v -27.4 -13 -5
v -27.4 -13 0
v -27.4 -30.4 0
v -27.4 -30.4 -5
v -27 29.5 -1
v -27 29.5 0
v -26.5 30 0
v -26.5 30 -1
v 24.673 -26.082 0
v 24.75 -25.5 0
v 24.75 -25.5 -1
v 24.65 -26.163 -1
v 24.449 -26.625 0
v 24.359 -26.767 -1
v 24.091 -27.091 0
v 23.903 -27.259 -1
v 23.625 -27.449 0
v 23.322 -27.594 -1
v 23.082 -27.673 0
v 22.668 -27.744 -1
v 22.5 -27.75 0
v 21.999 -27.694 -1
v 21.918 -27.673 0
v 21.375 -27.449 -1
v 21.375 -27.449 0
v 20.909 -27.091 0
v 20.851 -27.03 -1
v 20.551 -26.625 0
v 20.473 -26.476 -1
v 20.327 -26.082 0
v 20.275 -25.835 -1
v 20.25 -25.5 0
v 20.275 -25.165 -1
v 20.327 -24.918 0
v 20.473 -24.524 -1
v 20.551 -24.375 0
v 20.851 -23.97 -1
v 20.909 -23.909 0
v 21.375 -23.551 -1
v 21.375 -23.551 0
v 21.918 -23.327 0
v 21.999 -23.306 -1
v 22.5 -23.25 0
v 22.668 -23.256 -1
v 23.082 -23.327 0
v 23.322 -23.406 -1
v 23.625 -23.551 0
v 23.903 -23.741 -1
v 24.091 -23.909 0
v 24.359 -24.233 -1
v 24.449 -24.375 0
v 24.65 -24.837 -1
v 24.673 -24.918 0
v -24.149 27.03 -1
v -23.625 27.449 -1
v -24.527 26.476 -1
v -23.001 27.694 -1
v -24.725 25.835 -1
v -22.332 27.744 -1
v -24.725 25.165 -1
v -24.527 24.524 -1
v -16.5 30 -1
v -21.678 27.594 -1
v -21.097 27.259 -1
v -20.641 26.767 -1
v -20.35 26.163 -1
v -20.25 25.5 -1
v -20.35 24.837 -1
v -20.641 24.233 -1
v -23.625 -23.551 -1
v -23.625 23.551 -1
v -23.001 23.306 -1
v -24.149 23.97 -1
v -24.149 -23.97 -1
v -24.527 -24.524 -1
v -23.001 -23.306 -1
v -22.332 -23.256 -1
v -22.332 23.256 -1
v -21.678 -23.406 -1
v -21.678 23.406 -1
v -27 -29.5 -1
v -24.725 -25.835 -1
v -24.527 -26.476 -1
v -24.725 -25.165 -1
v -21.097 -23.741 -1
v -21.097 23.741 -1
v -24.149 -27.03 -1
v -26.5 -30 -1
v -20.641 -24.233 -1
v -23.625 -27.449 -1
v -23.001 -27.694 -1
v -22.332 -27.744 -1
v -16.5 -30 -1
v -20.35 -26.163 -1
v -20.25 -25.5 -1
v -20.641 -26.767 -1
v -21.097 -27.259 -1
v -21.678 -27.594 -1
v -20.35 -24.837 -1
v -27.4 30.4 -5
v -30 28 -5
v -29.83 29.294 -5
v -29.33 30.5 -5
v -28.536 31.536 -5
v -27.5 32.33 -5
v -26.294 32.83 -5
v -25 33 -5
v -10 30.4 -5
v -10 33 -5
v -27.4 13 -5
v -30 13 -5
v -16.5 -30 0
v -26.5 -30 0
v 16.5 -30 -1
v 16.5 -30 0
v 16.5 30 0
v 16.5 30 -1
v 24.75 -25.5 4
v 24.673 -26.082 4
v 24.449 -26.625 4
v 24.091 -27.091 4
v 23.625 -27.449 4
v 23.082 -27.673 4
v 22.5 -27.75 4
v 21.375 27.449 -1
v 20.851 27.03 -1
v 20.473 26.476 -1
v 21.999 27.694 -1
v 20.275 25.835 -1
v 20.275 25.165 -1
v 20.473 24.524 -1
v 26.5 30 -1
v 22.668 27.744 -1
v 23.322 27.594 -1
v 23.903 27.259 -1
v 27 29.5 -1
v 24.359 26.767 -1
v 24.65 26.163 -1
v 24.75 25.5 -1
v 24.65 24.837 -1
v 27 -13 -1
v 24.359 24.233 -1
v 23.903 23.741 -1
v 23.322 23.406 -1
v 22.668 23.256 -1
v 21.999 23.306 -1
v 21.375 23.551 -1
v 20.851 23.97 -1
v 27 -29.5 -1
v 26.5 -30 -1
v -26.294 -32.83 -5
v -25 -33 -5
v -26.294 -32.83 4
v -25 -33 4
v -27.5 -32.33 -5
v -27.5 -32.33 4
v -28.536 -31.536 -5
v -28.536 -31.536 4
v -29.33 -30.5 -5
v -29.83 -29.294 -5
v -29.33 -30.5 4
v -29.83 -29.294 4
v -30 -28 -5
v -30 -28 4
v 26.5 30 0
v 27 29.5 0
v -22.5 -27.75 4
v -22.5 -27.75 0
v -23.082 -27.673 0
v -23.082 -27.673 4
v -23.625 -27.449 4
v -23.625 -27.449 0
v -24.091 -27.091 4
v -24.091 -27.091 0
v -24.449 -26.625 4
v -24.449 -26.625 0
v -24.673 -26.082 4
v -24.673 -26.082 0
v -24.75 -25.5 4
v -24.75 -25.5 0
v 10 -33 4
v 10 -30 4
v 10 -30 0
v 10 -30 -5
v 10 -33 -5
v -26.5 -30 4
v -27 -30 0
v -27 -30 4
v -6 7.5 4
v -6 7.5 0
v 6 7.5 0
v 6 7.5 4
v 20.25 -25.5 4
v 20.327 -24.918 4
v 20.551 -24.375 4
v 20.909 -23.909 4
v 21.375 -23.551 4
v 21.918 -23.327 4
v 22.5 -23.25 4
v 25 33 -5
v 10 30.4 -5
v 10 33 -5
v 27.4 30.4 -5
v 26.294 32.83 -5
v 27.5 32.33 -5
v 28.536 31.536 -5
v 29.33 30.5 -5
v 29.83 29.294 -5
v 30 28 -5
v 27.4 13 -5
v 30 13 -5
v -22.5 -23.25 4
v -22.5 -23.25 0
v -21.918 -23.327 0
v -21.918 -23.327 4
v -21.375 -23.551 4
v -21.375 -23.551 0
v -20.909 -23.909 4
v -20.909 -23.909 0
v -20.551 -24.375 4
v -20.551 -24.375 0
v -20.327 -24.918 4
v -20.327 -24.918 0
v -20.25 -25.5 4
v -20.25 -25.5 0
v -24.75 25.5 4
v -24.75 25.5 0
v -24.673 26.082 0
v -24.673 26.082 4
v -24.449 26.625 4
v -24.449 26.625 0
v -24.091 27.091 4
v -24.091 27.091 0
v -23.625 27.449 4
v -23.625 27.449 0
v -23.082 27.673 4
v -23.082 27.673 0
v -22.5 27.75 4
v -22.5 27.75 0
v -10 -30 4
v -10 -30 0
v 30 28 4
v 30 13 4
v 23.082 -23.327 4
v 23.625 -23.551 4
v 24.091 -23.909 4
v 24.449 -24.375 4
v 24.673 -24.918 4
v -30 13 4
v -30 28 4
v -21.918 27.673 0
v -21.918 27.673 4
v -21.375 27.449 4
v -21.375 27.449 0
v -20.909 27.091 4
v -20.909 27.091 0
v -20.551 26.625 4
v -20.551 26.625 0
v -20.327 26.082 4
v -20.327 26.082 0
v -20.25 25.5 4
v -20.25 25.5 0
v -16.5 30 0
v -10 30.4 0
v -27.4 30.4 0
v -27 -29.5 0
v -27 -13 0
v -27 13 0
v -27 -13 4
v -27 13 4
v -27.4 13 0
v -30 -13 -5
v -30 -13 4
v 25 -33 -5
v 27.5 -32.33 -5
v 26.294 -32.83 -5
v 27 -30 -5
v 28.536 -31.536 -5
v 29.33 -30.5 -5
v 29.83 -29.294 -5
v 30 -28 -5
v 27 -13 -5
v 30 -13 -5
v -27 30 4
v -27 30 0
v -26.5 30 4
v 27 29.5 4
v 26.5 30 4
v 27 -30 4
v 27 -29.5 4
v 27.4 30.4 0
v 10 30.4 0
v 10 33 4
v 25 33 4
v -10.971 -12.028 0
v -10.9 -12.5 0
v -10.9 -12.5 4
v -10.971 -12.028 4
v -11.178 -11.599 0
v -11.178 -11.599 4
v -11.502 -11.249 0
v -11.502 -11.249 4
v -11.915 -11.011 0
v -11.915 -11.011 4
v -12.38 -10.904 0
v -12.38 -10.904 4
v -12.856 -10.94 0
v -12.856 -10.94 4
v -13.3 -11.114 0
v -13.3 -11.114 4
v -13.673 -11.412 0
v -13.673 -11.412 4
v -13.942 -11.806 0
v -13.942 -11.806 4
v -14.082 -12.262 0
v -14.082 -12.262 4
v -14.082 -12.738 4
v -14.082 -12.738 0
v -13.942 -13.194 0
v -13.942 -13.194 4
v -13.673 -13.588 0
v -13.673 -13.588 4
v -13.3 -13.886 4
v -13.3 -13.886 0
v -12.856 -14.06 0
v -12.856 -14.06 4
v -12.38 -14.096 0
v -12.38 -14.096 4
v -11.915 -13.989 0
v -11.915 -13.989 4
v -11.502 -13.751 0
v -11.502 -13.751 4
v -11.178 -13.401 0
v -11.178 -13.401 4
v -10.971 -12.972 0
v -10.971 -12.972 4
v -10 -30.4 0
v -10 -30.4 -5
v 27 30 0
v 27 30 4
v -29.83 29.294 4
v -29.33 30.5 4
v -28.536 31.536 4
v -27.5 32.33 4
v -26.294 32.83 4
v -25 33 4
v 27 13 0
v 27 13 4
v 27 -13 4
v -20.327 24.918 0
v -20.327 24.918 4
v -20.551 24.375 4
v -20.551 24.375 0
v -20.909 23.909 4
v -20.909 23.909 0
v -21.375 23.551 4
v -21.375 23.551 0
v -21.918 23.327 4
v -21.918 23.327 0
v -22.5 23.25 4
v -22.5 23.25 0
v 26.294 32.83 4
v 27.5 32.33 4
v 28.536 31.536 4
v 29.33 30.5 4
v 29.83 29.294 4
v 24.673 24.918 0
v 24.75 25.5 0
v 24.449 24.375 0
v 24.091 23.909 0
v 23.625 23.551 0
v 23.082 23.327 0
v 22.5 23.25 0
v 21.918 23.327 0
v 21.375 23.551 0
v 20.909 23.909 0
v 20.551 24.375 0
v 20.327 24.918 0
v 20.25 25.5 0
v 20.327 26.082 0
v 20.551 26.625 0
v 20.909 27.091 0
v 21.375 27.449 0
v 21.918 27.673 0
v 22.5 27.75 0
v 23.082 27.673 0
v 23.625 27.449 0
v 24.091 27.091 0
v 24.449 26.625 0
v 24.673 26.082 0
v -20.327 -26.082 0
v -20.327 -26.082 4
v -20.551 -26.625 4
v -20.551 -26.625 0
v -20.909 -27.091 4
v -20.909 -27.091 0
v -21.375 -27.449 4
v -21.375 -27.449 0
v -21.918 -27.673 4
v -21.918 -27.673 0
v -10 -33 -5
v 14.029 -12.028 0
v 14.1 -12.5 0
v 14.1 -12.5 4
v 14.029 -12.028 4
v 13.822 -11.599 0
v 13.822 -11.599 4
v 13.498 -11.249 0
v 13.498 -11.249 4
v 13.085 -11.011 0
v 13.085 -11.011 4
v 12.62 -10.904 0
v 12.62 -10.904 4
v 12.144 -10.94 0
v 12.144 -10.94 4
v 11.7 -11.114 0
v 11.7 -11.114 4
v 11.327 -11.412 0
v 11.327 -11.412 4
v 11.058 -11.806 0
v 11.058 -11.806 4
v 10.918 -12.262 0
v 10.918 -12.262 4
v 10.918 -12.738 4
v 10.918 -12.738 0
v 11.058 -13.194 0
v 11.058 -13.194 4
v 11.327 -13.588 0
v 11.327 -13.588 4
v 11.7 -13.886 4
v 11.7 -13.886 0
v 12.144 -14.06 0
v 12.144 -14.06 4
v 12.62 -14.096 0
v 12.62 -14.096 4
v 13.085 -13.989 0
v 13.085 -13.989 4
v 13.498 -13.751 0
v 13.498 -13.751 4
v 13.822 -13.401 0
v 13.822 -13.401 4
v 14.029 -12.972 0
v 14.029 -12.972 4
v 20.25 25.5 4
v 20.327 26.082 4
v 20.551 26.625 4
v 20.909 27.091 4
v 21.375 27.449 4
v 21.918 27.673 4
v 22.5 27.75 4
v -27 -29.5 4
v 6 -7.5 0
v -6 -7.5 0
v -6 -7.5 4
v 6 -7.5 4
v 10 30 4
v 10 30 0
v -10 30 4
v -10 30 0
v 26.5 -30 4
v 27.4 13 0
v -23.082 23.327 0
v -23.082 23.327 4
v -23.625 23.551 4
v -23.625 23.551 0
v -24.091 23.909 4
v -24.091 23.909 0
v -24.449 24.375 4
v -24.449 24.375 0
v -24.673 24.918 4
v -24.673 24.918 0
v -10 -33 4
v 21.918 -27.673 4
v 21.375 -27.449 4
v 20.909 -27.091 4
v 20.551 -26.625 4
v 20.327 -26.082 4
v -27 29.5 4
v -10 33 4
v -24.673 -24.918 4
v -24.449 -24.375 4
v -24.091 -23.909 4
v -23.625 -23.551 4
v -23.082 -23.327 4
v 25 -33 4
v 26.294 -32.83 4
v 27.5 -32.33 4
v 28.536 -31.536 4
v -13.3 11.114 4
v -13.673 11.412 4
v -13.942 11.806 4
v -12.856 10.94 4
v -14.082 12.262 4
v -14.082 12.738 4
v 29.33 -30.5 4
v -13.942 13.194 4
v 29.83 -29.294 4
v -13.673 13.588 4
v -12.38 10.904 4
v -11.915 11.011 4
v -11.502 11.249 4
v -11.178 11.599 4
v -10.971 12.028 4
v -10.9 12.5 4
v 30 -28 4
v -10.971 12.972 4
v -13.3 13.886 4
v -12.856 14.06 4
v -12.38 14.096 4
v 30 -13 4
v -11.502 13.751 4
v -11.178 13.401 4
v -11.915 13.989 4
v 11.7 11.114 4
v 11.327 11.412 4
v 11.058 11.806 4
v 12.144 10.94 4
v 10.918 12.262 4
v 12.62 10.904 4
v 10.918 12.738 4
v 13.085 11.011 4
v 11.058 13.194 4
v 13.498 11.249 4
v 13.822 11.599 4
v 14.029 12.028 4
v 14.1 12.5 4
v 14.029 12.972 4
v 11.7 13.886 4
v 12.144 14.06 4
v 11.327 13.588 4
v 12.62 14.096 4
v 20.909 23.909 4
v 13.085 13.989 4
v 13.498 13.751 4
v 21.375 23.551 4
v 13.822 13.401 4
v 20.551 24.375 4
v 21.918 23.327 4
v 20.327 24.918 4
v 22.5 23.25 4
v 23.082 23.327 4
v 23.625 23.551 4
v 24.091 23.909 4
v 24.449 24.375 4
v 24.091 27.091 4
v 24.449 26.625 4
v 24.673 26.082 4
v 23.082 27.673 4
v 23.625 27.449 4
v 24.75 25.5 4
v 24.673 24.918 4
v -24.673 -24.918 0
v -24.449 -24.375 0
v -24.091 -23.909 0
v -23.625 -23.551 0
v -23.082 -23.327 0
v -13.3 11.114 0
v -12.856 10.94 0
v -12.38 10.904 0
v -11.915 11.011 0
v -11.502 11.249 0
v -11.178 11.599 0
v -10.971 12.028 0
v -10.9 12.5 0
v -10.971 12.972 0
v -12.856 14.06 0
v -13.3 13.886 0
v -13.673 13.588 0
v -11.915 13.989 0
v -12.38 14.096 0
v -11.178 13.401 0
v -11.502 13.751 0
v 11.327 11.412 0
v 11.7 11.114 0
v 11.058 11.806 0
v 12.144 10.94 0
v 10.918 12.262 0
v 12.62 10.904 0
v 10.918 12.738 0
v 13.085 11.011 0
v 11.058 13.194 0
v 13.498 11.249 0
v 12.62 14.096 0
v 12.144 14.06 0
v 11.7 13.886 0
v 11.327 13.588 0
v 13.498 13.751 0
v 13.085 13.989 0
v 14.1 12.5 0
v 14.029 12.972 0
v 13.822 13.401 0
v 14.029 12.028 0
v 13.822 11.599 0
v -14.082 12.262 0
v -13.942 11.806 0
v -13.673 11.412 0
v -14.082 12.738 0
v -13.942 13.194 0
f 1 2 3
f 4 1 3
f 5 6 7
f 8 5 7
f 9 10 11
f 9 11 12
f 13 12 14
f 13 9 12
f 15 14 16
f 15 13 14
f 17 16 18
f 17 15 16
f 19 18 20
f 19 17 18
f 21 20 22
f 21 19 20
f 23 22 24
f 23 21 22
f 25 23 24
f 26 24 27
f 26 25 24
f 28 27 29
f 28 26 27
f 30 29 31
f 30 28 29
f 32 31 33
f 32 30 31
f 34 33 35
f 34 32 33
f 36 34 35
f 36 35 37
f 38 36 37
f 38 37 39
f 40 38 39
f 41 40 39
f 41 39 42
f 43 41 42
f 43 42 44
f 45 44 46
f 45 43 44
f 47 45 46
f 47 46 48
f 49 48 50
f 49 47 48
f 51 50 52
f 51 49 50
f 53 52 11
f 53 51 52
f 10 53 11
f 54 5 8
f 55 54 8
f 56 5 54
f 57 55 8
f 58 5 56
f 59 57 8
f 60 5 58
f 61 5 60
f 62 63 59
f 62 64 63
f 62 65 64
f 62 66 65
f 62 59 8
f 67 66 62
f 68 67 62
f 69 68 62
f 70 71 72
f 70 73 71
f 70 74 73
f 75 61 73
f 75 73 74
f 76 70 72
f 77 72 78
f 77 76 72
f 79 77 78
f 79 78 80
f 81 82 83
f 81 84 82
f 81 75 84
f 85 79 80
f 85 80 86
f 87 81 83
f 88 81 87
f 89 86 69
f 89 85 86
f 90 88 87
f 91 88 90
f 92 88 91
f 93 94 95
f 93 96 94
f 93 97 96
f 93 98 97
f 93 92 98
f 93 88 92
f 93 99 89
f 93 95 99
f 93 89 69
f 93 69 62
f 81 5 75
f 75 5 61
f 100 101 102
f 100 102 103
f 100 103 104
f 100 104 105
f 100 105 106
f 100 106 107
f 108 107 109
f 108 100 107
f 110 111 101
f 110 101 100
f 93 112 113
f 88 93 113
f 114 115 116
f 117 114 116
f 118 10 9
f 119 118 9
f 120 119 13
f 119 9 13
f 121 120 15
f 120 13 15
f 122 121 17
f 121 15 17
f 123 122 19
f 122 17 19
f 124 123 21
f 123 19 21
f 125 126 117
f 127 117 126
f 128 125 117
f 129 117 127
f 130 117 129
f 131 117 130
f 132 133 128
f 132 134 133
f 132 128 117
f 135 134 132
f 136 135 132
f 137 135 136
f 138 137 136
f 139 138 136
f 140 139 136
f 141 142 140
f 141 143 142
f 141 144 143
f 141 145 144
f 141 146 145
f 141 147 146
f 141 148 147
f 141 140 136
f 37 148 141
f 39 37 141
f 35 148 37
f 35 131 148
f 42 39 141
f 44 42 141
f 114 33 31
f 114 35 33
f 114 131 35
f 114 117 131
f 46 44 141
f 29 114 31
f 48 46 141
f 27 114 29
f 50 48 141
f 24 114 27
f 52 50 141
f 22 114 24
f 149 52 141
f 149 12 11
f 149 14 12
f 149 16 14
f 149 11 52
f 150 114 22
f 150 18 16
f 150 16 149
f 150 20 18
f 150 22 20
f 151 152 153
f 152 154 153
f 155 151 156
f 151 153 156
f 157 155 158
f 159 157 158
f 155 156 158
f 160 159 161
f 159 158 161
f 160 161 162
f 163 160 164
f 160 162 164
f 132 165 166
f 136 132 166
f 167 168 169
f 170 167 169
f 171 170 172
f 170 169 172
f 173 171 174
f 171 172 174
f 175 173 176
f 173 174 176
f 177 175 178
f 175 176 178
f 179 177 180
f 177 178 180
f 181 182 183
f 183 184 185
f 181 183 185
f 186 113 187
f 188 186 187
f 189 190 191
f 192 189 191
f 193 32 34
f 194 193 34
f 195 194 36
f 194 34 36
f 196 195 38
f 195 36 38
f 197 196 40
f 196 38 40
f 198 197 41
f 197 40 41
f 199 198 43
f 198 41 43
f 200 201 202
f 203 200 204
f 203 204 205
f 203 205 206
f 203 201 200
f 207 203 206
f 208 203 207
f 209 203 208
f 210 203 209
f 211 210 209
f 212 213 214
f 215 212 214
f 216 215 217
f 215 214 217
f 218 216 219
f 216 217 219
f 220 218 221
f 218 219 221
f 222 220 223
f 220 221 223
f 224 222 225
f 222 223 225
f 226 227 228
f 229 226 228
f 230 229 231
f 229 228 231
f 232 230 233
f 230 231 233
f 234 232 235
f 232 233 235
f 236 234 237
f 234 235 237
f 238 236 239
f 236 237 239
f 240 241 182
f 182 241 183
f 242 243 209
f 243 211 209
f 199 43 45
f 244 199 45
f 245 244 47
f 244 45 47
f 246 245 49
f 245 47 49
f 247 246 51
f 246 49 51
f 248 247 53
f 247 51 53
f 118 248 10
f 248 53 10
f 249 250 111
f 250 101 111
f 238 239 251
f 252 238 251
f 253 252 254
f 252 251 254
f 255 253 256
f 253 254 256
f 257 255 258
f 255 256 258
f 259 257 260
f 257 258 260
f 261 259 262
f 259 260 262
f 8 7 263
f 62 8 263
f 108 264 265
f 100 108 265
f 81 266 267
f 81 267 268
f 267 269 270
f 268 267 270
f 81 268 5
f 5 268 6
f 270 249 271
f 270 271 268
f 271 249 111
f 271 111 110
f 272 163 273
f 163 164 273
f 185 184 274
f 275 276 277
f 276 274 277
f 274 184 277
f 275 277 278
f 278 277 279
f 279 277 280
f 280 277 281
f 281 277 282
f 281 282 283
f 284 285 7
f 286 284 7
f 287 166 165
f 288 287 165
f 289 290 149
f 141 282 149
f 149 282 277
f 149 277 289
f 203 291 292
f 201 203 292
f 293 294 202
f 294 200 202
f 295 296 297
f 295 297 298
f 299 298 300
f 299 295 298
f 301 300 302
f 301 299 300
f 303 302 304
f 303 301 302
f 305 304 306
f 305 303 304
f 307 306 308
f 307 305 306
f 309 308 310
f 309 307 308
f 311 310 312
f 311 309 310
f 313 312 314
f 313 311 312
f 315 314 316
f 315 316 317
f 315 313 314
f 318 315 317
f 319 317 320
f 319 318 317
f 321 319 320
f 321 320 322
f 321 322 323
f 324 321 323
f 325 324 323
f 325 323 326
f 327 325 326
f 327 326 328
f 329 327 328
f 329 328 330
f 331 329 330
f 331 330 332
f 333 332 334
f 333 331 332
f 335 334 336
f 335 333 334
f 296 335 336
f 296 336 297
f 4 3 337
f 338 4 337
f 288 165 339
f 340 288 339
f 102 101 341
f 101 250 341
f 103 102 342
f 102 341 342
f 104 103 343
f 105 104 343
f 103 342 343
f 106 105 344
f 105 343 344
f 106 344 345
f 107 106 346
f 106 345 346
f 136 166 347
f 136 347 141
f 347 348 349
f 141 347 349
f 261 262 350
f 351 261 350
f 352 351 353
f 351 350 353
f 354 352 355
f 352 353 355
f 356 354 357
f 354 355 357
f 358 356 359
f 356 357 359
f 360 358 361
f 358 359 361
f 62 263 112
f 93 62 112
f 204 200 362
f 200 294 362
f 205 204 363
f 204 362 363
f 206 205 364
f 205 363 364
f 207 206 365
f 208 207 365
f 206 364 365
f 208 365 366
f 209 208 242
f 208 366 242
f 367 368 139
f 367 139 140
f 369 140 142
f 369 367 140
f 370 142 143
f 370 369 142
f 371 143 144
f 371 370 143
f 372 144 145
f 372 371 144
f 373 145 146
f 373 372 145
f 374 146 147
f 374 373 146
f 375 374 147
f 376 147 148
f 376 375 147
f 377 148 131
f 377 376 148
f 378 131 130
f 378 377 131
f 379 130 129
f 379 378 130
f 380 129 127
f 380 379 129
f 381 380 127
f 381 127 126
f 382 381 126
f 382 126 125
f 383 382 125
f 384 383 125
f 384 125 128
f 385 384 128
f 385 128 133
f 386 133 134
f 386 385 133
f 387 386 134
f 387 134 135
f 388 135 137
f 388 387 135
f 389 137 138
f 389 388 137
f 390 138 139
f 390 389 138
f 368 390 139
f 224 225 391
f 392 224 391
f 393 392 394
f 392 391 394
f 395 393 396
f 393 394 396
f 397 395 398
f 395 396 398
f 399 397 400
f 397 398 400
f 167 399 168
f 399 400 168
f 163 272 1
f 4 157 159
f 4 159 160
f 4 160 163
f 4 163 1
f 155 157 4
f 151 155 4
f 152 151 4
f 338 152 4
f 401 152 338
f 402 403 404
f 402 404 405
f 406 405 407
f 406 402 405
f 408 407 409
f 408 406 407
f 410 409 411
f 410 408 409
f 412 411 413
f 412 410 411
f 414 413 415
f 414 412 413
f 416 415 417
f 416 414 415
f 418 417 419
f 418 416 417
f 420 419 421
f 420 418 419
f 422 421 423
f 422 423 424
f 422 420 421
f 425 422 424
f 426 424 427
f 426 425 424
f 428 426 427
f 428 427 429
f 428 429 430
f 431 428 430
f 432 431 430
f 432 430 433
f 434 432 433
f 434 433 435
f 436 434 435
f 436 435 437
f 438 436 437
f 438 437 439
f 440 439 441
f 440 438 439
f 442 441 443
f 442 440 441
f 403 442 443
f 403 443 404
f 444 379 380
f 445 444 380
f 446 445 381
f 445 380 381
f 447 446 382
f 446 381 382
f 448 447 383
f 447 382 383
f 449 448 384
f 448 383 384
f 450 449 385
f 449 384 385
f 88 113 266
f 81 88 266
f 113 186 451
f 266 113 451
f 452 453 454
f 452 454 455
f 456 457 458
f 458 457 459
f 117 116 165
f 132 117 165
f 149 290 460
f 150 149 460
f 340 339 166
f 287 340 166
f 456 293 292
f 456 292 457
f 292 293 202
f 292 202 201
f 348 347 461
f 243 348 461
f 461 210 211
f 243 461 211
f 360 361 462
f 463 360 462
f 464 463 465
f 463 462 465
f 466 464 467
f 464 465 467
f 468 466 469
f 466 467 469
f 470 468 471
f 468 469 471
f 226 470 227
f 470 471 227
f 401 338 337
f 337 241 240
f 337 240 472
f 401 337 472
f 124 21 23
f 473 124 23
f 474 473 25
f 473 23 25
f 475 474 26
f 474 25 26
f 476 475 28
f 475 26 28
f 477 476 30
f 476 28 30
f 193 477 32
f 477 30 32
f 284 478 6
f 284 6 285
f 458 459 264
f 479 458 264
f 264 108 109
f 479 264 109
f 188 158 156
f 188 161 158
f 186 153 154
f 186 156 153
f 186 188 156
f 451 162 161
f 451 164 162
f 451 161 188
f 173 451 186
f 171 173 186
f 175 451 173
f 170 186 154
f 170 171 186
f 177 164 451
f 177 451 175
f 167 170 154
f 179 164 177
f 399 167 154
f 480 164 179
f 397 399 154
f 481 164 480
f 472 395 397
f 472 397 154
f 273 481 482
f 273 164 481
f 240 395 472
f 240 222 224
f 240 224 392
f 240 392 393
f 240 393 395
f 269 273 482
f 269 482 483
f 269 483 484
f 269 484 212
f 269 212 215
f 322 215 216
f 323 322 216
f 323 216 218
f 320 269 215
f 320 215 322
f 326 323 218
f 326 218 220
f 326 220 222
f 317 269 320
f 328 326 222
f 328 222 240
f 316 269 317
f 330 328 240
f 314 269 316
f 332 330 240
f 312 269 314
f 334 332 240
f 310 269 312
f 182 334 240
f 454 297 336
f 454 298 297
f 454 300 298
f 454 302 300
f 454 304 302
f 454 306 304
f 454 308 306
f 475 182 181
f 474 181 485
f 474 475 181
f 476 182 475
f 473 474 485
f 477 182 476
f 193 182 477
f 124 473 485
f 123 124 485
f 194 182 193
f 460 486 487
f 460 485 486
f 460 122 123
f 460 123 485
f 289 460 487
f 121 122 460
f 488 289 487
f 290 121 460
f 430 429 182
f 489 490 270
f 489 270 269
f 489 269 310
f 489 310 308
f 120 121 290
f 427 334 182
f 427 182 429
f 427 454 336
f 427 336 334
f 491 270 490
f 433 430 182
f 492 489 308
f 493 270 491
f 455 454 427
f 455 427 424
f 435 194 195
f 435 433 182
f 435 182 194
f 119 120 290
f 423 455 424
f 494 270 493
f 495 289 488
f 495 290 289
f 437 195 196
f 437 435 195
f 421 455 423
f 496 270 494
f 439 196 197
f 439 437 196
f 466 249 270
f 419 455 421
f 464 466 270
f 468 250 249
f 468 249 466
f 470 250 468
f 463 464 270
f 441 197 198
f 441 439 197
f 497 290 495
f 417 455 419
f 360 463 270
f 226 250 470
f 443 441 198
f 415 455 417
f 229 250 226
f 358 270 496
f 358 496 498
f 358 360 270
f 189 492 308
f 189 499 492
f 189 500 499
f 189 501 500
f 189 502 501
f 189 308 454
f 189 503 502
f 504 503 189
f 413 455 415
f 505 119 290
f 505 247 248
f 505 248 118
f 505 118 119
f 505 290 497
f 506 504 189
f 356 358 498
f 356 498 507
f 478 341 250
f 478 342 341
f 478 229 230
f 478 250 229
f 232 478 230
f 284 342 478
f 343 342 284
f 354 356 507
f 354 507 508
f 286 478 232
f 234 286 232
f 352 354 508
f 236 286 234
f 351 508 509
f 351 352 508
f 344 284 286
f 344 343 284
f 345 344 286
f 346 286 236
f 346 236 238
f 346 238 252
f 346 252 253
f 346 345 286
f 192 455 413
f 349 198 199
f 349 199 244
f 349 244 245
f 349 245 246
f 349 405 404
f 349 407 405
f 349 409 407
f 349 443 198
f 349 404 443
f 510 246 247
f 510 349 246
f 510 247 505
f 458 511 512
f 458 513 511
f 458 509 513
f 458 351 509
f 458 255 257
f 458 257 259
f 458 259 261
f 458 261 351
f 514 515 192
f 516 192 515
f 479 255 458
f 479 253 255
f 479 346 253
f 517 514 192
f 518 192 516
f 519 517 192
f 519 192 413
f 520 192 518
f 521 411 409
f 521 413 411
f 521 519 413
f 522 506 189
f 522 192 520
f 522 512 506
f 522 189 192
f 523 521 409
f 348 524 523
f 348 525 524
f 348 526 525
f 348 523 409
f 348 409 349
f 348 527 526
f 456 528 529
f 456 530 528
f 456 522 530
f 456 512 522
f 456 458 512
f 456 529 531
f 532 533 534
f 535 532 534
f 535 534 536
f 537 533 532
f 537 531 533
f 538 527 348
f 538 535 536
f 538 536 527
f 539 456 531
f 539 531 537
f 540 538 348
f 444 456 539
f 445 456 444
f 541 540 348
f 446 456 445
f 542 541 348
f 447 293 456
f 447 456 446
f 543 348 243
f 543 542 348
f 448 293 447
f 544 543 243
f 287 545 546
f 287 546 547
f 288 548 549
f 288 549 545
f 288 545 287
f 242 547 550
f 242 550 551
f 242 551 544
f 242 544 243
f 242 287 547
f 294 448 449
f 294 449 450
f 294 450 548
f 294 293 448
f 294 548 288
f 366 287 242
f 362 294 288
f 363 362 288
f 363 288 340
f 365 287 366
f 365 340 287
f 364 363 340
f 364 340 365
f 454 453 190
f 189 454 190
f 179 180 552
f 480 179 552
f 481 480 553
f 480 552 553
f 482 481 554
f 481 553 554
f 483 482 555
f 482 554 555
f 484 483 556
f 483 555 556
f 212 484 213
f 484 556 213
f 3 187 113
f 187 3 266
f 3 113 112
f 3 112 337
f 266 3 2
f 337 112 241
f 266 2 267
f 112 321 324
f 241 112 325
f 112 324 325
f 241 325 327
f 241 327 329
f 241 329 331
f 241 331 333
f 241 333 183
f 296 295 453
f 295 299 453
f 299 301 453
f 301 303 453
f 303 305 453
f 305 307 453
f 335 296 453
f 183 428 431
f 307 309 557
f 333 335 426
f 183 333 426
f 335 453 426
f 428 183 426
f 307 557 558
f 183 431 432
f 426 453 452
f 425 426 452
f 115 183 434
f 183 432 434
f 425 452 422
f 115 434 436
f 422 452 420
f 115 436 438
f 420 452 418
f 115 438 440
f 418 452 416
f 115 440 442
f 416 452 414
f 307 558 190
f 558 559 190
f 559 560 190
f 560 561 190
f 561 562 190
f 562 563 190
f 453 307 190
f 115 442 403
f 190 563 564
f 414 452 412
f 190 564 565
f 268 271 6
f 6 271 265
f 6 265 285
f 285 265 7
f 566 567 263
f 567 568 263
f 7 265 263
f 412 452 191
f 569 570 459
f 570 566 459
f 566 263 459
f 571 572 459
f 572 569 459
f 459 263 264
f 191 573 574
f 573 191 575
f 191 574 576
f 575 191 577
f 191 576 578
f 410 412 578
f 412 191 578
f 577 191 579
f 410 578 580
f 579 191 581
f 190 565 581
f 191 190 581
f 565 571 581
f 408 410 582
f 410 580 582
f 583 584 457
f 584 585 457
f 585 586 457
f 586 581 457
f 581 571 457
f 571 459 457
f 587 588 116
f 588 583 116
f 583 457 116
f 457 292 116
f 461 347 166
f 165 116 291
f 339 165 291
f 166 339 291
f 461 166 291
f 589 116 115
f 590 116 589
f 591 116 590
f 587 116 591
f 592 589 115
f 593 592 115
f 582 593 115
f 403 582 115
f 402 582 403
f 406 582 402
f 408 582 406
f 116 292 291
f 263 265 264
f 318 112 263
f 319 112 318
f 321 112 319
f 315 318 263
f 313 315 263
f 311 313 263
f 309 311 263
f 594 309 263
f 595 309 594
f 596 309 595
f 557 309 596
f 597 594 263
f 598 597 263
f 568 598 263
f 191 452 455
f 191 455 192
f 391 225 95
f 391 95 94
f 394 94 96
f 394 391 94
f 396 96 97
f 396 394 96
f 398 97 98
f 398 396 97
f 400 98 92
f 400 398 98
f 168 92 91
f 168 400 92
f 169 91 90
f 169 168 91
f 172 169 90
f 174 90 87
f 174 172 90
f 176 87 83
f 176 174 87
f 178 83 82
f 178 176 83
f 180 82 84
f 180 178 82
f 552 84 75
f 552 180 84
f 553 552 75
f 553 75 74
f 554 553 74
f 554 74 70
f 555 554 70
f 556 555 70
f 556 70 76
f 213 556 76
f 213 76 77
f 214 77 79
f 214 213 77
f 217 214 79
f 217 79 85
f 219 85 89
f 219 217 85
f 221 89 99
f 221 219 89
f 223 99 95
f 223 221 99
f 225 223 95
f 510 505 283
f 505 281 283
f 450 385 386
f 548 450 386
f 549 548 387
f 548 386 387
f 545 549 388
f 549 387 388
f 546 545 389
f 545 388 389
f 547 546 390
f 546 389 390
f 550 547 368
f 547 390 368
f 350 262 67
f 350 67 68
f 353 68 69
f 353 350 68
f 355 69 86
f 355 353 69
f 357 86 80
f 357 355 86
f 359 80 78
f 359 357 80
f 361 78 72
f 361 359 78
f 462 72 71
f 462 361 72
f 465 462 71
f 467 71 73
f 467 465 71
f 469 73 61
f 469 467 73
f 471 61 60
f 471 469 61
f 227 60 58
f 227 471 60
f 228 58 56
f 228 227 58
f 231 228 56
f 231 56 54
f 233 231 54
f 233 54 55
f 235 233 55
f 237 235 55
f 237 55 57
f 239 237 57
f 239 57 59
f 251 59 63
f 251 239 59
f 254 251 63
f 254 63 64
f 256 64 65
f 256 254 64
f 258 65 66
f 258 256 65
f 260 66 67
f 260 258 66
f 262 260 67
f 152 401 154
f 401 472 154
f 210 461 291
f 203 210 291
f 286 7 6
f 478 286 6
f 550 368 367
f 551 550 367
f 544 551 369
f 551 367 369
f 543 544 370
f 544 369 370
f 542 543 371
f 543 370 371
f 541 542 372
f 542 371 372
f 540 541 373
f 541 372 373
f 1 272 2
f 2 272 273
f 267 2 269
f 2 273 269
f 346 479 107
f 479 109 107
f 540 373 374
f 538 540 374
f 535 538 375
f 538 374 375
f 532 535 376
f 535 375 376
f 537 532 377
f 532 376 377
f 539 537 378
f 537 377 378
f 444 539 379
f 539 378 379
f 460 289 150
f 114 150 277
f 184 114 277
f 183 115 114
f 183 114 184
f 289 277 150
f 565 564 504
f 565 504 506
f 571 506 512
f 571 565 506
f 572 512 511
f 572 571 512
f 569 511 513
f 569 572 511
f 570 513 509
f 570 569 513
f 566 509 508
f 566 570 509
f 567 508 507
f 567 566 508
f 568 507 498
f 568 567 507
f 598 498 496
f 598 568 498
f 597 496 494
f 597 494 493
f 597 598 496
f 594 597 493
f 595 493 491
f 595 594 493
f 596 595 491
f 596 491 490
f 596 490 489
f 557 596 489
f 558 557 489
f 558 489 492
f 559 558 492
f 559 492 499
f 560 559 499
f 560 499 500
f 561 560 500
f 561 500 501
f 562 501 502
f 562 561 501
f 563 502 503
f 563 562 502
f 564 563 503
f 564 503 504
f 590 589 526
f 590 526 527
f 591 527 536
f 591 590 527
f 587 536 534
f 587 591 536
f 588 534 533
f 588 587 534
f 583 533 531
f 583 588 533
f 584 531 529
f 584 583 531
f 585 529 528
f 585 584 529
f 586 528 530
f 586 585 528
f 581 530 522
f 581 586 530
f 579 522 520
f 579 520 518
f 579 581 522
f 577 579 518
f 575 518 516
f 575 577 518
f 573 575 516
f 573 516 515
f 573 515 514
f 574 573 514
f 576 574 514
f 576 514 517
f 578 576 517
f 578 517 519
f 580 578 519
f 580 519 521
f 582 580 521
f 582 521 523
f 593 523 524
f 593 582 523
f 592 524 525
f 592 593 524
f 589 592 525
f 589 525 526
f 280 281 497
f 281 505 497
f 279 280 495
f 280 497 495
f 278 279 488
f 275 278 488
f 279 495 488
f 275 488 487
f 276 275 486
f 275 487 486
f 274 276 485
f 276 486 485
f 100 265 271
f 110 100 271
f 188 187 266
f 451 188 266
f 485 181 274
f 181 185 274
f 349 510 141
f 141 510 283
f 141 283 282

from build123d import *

# Parameters (mm, degrees)
F0_R     = 1.6
F0_W     = 12
F0_H     = 15
F1_DEPTH = 4
F2_R     = 2.25
F3_DEPTH = 1
F4_DEPTH = 5
F5_R     = 5


# Not quite as in the source:
# - ends of sketch curves that miss each other by under 0.0002 mm in the source are joined


with BuildPart() as f1:
    # F0 (on Top) → F1 (new body)
    with BuildSketch(Plane.XY):
        Polygon((-26.600003, -29.899997), (-26.5, -30), (-10, -30), (10, -30), (26.5, -30), (26.6, -29.9), (27, -29.5), (27, -13), (27, 13), (27, 29.5), (26.5999975, 29.9000025), (26.5, 30), (10, 30), (-10, 30), (-26.5, 30), (-26.599999, 29.900001), (-27, 29.5), (-27, 13), (-27, -13), (-27, -29.5), align=None)
        with BuildLine():
            ThreePointArc((-22.5, -23.25), (-20.9090097423, -23.9090097423), (-20.25, -25.5))
            ThreePointArc((-20.25, -25.5), (-20.9090097423, -27.0909902577), (-22.5, -27.75))
            ThreePointArc((-22.5, -27.75), (-24.0909902577, -27.0909902577), (-24.75, -25.5))
            ThreePointArc((-24.75, -25.5), (-24.0909902577, -23.9090097423), (-22.5, -23.25))
        make_face(mode=Mode.SUBTRACT)
        with Locations((-12.5, -12.5)):
            Circle(F0_R, mode=Mode.SUBTRACT)
        with BuildLine():
            ThreePointArc((22.5, -23.25), (24.0909902577, -23.9090097423), (24.75, -25.5))
            ThreePointArc((24.75, -25.5), (24.0909902577, -27.0909902577), (22.5, -27.75))
            ThreePointArc((22.5, -27.75), (20.9090097423, -27.0909902577), (20.25, -25.5))
            ThreePointArc((20.25, -25.5), (20.9090097423, -23.9090097423), (22.5, -23.25))
        make_face(mode=Mode.SUBTRACT)
        with Locations((12.5, -12.5)):
            Circle(F0_R, mode=Mode.SUBTRACT)
        with Locations((-12.5, 12.5)):
            Circle(F0_R, mode=Mode.SUBTRACT)
        with BuildLine():
            ThreePointArc((-22.5, 27.75), (-20.9090097423, 27.0909902577), (-20.25, 25.5))
            ThreePointArc((-20.25, 25.5), (-20.9090097423, 23.9090097423), (-22.5, 23.25))
            ThreePointArc((-22.5, 23.25), (-24.0909902577, 23.9090097423), (-24.75, 25.5))
            ThreePointArc((-24.75, 25.5), (-24.0909902577, 27.0909902577), (-22.5, 27.75))
        make_face(mode=Mode.SUBTRACT)
        Rectangle(F0_W, F0_H, mode=Mode.SUBTRACT)
        with Locations((12.5, 12.5)):
            Circle(F0_R, mode=Mode.SUBTRACT)
        with BuildLine():
            ThreePointArc((22.5, 27.75), (24.0909902577, 27.0909902577), (24.75, 25.5))
            ThreePointArc((24.75, 25.5), (24.0909902577, 23.9090097423), (22.5, 23.25))
            ThreePointArc((22.5, 23.25), (20.9090097423, 23.9090097423), (20.25, 25.5))
            ThreePointArc((20.25, 25.5), (20.9090097423, 27.0909902577), (22.5, 27.75))
        make_face(mode=Mode.SUBTRACT)
        Polygon((-10, -30), (-26.5, -30), (-26.6, -30), (-27, -30), (-27, -29.5), (-27, -13), (-30, -13), (-30, -33), (-10, -33), align=None)
        Polygon((26.5, -30), (10, -30), (10, -33), (30, -33), (30, -13), (27, -13), (27, -29.5), (27, -30), (26.6, -30), align=None)
        Polygon((27, 29.5), (27, 13), (30, 13), (30, 33), (10, 33), (10, 30), (26.5, 30), (26.6, 30), (27, 30), align=None)
        Polygon((-30, 13), (-27, 13), (-27, 29.5), (-27, 30), (-26.6, 30), (-26.5, 30), (-10, 30), (-10, 33), (-30, 33), align=None)
    extrude(amount=F1_DEPTH)

    # F2 (on face) → F3 (join)
    with BuildSketch(Plane(origin=(0, 0, 0), x_dir=(1, 0, 0), z_dir=(0, 0, -1))):
        Polygon((-16.5, -30), (-16.5, 30), (-26.5, 30), (-27, 29.5), (-27, 13), (-27, -13), (-27, -29.500004), (-26.5, -30), align=None)
        with Locations((-22.5, -25.5)):
            Circle(F2_R, mode=Mode.SUBTRACT)
        with Locations((-22.5, 25.5)):
            Circle(F2_R, mode=Mode.SUBTRACT)
        Polygon((27, -13), (27, 13), (27, 29.5), (26.5, 30), (16.5, 30), (16.5, -30), (26.5, -30), (27, -29.500004), align=None)
        with Locations((22.5, -25.5)):
            Circle(F2_R, mode=Mode.SUBTRACT)
        with Locations((22.5, 25.5)):
            Circle(F2_R, mode=Mode.SUBTRACT)
    extrude(amount=F3_DEPTH)

    # F2 (on face) + F0 (on Top) → F4 (join)
    with BuildSketch(Plane(origin=(0, 0, 0), x_dir=(1, 0, 0), z_dir=(0, 0, -1))):
        Polygon((-30, 13), (-27.4, 13), (-27.4, 30.4), (-10, 30.4), (-10, 33), (-30, 33), align=None)
        Polygon((-27.4, -30.4), (-27.4, -13), (-30, -13), (-30, -33), (-10, -33), (-10, -30.4), align=None)
        Polygon((27.4, -30.4), (10, -30.4), (10, -33), (30, -33), (30, -13), (27.4, -13), align=None)
    with BuildSketch(Plane.XY):
        Polygon((26.5, -30), (10, -30), (10, -33), (30, -33), (30, -13), (27, -13), (27, -29.5), (27, -30), (26.6, -30), align=None)
    extrude(amount=F4_DEPTH, dir=(0, 0, -1))

    # F5
    f5_edges = [f1.edges().sort_by_distance(p)[0] for p in [
        (30, -33, -0.5),
        (30, 33, -0.5),
        (-30, 33, -0.5),
        (-30, -33, -0.5),
    ]]
    fillet(f5_edges, radius=F5_R)


solid = f1.part
